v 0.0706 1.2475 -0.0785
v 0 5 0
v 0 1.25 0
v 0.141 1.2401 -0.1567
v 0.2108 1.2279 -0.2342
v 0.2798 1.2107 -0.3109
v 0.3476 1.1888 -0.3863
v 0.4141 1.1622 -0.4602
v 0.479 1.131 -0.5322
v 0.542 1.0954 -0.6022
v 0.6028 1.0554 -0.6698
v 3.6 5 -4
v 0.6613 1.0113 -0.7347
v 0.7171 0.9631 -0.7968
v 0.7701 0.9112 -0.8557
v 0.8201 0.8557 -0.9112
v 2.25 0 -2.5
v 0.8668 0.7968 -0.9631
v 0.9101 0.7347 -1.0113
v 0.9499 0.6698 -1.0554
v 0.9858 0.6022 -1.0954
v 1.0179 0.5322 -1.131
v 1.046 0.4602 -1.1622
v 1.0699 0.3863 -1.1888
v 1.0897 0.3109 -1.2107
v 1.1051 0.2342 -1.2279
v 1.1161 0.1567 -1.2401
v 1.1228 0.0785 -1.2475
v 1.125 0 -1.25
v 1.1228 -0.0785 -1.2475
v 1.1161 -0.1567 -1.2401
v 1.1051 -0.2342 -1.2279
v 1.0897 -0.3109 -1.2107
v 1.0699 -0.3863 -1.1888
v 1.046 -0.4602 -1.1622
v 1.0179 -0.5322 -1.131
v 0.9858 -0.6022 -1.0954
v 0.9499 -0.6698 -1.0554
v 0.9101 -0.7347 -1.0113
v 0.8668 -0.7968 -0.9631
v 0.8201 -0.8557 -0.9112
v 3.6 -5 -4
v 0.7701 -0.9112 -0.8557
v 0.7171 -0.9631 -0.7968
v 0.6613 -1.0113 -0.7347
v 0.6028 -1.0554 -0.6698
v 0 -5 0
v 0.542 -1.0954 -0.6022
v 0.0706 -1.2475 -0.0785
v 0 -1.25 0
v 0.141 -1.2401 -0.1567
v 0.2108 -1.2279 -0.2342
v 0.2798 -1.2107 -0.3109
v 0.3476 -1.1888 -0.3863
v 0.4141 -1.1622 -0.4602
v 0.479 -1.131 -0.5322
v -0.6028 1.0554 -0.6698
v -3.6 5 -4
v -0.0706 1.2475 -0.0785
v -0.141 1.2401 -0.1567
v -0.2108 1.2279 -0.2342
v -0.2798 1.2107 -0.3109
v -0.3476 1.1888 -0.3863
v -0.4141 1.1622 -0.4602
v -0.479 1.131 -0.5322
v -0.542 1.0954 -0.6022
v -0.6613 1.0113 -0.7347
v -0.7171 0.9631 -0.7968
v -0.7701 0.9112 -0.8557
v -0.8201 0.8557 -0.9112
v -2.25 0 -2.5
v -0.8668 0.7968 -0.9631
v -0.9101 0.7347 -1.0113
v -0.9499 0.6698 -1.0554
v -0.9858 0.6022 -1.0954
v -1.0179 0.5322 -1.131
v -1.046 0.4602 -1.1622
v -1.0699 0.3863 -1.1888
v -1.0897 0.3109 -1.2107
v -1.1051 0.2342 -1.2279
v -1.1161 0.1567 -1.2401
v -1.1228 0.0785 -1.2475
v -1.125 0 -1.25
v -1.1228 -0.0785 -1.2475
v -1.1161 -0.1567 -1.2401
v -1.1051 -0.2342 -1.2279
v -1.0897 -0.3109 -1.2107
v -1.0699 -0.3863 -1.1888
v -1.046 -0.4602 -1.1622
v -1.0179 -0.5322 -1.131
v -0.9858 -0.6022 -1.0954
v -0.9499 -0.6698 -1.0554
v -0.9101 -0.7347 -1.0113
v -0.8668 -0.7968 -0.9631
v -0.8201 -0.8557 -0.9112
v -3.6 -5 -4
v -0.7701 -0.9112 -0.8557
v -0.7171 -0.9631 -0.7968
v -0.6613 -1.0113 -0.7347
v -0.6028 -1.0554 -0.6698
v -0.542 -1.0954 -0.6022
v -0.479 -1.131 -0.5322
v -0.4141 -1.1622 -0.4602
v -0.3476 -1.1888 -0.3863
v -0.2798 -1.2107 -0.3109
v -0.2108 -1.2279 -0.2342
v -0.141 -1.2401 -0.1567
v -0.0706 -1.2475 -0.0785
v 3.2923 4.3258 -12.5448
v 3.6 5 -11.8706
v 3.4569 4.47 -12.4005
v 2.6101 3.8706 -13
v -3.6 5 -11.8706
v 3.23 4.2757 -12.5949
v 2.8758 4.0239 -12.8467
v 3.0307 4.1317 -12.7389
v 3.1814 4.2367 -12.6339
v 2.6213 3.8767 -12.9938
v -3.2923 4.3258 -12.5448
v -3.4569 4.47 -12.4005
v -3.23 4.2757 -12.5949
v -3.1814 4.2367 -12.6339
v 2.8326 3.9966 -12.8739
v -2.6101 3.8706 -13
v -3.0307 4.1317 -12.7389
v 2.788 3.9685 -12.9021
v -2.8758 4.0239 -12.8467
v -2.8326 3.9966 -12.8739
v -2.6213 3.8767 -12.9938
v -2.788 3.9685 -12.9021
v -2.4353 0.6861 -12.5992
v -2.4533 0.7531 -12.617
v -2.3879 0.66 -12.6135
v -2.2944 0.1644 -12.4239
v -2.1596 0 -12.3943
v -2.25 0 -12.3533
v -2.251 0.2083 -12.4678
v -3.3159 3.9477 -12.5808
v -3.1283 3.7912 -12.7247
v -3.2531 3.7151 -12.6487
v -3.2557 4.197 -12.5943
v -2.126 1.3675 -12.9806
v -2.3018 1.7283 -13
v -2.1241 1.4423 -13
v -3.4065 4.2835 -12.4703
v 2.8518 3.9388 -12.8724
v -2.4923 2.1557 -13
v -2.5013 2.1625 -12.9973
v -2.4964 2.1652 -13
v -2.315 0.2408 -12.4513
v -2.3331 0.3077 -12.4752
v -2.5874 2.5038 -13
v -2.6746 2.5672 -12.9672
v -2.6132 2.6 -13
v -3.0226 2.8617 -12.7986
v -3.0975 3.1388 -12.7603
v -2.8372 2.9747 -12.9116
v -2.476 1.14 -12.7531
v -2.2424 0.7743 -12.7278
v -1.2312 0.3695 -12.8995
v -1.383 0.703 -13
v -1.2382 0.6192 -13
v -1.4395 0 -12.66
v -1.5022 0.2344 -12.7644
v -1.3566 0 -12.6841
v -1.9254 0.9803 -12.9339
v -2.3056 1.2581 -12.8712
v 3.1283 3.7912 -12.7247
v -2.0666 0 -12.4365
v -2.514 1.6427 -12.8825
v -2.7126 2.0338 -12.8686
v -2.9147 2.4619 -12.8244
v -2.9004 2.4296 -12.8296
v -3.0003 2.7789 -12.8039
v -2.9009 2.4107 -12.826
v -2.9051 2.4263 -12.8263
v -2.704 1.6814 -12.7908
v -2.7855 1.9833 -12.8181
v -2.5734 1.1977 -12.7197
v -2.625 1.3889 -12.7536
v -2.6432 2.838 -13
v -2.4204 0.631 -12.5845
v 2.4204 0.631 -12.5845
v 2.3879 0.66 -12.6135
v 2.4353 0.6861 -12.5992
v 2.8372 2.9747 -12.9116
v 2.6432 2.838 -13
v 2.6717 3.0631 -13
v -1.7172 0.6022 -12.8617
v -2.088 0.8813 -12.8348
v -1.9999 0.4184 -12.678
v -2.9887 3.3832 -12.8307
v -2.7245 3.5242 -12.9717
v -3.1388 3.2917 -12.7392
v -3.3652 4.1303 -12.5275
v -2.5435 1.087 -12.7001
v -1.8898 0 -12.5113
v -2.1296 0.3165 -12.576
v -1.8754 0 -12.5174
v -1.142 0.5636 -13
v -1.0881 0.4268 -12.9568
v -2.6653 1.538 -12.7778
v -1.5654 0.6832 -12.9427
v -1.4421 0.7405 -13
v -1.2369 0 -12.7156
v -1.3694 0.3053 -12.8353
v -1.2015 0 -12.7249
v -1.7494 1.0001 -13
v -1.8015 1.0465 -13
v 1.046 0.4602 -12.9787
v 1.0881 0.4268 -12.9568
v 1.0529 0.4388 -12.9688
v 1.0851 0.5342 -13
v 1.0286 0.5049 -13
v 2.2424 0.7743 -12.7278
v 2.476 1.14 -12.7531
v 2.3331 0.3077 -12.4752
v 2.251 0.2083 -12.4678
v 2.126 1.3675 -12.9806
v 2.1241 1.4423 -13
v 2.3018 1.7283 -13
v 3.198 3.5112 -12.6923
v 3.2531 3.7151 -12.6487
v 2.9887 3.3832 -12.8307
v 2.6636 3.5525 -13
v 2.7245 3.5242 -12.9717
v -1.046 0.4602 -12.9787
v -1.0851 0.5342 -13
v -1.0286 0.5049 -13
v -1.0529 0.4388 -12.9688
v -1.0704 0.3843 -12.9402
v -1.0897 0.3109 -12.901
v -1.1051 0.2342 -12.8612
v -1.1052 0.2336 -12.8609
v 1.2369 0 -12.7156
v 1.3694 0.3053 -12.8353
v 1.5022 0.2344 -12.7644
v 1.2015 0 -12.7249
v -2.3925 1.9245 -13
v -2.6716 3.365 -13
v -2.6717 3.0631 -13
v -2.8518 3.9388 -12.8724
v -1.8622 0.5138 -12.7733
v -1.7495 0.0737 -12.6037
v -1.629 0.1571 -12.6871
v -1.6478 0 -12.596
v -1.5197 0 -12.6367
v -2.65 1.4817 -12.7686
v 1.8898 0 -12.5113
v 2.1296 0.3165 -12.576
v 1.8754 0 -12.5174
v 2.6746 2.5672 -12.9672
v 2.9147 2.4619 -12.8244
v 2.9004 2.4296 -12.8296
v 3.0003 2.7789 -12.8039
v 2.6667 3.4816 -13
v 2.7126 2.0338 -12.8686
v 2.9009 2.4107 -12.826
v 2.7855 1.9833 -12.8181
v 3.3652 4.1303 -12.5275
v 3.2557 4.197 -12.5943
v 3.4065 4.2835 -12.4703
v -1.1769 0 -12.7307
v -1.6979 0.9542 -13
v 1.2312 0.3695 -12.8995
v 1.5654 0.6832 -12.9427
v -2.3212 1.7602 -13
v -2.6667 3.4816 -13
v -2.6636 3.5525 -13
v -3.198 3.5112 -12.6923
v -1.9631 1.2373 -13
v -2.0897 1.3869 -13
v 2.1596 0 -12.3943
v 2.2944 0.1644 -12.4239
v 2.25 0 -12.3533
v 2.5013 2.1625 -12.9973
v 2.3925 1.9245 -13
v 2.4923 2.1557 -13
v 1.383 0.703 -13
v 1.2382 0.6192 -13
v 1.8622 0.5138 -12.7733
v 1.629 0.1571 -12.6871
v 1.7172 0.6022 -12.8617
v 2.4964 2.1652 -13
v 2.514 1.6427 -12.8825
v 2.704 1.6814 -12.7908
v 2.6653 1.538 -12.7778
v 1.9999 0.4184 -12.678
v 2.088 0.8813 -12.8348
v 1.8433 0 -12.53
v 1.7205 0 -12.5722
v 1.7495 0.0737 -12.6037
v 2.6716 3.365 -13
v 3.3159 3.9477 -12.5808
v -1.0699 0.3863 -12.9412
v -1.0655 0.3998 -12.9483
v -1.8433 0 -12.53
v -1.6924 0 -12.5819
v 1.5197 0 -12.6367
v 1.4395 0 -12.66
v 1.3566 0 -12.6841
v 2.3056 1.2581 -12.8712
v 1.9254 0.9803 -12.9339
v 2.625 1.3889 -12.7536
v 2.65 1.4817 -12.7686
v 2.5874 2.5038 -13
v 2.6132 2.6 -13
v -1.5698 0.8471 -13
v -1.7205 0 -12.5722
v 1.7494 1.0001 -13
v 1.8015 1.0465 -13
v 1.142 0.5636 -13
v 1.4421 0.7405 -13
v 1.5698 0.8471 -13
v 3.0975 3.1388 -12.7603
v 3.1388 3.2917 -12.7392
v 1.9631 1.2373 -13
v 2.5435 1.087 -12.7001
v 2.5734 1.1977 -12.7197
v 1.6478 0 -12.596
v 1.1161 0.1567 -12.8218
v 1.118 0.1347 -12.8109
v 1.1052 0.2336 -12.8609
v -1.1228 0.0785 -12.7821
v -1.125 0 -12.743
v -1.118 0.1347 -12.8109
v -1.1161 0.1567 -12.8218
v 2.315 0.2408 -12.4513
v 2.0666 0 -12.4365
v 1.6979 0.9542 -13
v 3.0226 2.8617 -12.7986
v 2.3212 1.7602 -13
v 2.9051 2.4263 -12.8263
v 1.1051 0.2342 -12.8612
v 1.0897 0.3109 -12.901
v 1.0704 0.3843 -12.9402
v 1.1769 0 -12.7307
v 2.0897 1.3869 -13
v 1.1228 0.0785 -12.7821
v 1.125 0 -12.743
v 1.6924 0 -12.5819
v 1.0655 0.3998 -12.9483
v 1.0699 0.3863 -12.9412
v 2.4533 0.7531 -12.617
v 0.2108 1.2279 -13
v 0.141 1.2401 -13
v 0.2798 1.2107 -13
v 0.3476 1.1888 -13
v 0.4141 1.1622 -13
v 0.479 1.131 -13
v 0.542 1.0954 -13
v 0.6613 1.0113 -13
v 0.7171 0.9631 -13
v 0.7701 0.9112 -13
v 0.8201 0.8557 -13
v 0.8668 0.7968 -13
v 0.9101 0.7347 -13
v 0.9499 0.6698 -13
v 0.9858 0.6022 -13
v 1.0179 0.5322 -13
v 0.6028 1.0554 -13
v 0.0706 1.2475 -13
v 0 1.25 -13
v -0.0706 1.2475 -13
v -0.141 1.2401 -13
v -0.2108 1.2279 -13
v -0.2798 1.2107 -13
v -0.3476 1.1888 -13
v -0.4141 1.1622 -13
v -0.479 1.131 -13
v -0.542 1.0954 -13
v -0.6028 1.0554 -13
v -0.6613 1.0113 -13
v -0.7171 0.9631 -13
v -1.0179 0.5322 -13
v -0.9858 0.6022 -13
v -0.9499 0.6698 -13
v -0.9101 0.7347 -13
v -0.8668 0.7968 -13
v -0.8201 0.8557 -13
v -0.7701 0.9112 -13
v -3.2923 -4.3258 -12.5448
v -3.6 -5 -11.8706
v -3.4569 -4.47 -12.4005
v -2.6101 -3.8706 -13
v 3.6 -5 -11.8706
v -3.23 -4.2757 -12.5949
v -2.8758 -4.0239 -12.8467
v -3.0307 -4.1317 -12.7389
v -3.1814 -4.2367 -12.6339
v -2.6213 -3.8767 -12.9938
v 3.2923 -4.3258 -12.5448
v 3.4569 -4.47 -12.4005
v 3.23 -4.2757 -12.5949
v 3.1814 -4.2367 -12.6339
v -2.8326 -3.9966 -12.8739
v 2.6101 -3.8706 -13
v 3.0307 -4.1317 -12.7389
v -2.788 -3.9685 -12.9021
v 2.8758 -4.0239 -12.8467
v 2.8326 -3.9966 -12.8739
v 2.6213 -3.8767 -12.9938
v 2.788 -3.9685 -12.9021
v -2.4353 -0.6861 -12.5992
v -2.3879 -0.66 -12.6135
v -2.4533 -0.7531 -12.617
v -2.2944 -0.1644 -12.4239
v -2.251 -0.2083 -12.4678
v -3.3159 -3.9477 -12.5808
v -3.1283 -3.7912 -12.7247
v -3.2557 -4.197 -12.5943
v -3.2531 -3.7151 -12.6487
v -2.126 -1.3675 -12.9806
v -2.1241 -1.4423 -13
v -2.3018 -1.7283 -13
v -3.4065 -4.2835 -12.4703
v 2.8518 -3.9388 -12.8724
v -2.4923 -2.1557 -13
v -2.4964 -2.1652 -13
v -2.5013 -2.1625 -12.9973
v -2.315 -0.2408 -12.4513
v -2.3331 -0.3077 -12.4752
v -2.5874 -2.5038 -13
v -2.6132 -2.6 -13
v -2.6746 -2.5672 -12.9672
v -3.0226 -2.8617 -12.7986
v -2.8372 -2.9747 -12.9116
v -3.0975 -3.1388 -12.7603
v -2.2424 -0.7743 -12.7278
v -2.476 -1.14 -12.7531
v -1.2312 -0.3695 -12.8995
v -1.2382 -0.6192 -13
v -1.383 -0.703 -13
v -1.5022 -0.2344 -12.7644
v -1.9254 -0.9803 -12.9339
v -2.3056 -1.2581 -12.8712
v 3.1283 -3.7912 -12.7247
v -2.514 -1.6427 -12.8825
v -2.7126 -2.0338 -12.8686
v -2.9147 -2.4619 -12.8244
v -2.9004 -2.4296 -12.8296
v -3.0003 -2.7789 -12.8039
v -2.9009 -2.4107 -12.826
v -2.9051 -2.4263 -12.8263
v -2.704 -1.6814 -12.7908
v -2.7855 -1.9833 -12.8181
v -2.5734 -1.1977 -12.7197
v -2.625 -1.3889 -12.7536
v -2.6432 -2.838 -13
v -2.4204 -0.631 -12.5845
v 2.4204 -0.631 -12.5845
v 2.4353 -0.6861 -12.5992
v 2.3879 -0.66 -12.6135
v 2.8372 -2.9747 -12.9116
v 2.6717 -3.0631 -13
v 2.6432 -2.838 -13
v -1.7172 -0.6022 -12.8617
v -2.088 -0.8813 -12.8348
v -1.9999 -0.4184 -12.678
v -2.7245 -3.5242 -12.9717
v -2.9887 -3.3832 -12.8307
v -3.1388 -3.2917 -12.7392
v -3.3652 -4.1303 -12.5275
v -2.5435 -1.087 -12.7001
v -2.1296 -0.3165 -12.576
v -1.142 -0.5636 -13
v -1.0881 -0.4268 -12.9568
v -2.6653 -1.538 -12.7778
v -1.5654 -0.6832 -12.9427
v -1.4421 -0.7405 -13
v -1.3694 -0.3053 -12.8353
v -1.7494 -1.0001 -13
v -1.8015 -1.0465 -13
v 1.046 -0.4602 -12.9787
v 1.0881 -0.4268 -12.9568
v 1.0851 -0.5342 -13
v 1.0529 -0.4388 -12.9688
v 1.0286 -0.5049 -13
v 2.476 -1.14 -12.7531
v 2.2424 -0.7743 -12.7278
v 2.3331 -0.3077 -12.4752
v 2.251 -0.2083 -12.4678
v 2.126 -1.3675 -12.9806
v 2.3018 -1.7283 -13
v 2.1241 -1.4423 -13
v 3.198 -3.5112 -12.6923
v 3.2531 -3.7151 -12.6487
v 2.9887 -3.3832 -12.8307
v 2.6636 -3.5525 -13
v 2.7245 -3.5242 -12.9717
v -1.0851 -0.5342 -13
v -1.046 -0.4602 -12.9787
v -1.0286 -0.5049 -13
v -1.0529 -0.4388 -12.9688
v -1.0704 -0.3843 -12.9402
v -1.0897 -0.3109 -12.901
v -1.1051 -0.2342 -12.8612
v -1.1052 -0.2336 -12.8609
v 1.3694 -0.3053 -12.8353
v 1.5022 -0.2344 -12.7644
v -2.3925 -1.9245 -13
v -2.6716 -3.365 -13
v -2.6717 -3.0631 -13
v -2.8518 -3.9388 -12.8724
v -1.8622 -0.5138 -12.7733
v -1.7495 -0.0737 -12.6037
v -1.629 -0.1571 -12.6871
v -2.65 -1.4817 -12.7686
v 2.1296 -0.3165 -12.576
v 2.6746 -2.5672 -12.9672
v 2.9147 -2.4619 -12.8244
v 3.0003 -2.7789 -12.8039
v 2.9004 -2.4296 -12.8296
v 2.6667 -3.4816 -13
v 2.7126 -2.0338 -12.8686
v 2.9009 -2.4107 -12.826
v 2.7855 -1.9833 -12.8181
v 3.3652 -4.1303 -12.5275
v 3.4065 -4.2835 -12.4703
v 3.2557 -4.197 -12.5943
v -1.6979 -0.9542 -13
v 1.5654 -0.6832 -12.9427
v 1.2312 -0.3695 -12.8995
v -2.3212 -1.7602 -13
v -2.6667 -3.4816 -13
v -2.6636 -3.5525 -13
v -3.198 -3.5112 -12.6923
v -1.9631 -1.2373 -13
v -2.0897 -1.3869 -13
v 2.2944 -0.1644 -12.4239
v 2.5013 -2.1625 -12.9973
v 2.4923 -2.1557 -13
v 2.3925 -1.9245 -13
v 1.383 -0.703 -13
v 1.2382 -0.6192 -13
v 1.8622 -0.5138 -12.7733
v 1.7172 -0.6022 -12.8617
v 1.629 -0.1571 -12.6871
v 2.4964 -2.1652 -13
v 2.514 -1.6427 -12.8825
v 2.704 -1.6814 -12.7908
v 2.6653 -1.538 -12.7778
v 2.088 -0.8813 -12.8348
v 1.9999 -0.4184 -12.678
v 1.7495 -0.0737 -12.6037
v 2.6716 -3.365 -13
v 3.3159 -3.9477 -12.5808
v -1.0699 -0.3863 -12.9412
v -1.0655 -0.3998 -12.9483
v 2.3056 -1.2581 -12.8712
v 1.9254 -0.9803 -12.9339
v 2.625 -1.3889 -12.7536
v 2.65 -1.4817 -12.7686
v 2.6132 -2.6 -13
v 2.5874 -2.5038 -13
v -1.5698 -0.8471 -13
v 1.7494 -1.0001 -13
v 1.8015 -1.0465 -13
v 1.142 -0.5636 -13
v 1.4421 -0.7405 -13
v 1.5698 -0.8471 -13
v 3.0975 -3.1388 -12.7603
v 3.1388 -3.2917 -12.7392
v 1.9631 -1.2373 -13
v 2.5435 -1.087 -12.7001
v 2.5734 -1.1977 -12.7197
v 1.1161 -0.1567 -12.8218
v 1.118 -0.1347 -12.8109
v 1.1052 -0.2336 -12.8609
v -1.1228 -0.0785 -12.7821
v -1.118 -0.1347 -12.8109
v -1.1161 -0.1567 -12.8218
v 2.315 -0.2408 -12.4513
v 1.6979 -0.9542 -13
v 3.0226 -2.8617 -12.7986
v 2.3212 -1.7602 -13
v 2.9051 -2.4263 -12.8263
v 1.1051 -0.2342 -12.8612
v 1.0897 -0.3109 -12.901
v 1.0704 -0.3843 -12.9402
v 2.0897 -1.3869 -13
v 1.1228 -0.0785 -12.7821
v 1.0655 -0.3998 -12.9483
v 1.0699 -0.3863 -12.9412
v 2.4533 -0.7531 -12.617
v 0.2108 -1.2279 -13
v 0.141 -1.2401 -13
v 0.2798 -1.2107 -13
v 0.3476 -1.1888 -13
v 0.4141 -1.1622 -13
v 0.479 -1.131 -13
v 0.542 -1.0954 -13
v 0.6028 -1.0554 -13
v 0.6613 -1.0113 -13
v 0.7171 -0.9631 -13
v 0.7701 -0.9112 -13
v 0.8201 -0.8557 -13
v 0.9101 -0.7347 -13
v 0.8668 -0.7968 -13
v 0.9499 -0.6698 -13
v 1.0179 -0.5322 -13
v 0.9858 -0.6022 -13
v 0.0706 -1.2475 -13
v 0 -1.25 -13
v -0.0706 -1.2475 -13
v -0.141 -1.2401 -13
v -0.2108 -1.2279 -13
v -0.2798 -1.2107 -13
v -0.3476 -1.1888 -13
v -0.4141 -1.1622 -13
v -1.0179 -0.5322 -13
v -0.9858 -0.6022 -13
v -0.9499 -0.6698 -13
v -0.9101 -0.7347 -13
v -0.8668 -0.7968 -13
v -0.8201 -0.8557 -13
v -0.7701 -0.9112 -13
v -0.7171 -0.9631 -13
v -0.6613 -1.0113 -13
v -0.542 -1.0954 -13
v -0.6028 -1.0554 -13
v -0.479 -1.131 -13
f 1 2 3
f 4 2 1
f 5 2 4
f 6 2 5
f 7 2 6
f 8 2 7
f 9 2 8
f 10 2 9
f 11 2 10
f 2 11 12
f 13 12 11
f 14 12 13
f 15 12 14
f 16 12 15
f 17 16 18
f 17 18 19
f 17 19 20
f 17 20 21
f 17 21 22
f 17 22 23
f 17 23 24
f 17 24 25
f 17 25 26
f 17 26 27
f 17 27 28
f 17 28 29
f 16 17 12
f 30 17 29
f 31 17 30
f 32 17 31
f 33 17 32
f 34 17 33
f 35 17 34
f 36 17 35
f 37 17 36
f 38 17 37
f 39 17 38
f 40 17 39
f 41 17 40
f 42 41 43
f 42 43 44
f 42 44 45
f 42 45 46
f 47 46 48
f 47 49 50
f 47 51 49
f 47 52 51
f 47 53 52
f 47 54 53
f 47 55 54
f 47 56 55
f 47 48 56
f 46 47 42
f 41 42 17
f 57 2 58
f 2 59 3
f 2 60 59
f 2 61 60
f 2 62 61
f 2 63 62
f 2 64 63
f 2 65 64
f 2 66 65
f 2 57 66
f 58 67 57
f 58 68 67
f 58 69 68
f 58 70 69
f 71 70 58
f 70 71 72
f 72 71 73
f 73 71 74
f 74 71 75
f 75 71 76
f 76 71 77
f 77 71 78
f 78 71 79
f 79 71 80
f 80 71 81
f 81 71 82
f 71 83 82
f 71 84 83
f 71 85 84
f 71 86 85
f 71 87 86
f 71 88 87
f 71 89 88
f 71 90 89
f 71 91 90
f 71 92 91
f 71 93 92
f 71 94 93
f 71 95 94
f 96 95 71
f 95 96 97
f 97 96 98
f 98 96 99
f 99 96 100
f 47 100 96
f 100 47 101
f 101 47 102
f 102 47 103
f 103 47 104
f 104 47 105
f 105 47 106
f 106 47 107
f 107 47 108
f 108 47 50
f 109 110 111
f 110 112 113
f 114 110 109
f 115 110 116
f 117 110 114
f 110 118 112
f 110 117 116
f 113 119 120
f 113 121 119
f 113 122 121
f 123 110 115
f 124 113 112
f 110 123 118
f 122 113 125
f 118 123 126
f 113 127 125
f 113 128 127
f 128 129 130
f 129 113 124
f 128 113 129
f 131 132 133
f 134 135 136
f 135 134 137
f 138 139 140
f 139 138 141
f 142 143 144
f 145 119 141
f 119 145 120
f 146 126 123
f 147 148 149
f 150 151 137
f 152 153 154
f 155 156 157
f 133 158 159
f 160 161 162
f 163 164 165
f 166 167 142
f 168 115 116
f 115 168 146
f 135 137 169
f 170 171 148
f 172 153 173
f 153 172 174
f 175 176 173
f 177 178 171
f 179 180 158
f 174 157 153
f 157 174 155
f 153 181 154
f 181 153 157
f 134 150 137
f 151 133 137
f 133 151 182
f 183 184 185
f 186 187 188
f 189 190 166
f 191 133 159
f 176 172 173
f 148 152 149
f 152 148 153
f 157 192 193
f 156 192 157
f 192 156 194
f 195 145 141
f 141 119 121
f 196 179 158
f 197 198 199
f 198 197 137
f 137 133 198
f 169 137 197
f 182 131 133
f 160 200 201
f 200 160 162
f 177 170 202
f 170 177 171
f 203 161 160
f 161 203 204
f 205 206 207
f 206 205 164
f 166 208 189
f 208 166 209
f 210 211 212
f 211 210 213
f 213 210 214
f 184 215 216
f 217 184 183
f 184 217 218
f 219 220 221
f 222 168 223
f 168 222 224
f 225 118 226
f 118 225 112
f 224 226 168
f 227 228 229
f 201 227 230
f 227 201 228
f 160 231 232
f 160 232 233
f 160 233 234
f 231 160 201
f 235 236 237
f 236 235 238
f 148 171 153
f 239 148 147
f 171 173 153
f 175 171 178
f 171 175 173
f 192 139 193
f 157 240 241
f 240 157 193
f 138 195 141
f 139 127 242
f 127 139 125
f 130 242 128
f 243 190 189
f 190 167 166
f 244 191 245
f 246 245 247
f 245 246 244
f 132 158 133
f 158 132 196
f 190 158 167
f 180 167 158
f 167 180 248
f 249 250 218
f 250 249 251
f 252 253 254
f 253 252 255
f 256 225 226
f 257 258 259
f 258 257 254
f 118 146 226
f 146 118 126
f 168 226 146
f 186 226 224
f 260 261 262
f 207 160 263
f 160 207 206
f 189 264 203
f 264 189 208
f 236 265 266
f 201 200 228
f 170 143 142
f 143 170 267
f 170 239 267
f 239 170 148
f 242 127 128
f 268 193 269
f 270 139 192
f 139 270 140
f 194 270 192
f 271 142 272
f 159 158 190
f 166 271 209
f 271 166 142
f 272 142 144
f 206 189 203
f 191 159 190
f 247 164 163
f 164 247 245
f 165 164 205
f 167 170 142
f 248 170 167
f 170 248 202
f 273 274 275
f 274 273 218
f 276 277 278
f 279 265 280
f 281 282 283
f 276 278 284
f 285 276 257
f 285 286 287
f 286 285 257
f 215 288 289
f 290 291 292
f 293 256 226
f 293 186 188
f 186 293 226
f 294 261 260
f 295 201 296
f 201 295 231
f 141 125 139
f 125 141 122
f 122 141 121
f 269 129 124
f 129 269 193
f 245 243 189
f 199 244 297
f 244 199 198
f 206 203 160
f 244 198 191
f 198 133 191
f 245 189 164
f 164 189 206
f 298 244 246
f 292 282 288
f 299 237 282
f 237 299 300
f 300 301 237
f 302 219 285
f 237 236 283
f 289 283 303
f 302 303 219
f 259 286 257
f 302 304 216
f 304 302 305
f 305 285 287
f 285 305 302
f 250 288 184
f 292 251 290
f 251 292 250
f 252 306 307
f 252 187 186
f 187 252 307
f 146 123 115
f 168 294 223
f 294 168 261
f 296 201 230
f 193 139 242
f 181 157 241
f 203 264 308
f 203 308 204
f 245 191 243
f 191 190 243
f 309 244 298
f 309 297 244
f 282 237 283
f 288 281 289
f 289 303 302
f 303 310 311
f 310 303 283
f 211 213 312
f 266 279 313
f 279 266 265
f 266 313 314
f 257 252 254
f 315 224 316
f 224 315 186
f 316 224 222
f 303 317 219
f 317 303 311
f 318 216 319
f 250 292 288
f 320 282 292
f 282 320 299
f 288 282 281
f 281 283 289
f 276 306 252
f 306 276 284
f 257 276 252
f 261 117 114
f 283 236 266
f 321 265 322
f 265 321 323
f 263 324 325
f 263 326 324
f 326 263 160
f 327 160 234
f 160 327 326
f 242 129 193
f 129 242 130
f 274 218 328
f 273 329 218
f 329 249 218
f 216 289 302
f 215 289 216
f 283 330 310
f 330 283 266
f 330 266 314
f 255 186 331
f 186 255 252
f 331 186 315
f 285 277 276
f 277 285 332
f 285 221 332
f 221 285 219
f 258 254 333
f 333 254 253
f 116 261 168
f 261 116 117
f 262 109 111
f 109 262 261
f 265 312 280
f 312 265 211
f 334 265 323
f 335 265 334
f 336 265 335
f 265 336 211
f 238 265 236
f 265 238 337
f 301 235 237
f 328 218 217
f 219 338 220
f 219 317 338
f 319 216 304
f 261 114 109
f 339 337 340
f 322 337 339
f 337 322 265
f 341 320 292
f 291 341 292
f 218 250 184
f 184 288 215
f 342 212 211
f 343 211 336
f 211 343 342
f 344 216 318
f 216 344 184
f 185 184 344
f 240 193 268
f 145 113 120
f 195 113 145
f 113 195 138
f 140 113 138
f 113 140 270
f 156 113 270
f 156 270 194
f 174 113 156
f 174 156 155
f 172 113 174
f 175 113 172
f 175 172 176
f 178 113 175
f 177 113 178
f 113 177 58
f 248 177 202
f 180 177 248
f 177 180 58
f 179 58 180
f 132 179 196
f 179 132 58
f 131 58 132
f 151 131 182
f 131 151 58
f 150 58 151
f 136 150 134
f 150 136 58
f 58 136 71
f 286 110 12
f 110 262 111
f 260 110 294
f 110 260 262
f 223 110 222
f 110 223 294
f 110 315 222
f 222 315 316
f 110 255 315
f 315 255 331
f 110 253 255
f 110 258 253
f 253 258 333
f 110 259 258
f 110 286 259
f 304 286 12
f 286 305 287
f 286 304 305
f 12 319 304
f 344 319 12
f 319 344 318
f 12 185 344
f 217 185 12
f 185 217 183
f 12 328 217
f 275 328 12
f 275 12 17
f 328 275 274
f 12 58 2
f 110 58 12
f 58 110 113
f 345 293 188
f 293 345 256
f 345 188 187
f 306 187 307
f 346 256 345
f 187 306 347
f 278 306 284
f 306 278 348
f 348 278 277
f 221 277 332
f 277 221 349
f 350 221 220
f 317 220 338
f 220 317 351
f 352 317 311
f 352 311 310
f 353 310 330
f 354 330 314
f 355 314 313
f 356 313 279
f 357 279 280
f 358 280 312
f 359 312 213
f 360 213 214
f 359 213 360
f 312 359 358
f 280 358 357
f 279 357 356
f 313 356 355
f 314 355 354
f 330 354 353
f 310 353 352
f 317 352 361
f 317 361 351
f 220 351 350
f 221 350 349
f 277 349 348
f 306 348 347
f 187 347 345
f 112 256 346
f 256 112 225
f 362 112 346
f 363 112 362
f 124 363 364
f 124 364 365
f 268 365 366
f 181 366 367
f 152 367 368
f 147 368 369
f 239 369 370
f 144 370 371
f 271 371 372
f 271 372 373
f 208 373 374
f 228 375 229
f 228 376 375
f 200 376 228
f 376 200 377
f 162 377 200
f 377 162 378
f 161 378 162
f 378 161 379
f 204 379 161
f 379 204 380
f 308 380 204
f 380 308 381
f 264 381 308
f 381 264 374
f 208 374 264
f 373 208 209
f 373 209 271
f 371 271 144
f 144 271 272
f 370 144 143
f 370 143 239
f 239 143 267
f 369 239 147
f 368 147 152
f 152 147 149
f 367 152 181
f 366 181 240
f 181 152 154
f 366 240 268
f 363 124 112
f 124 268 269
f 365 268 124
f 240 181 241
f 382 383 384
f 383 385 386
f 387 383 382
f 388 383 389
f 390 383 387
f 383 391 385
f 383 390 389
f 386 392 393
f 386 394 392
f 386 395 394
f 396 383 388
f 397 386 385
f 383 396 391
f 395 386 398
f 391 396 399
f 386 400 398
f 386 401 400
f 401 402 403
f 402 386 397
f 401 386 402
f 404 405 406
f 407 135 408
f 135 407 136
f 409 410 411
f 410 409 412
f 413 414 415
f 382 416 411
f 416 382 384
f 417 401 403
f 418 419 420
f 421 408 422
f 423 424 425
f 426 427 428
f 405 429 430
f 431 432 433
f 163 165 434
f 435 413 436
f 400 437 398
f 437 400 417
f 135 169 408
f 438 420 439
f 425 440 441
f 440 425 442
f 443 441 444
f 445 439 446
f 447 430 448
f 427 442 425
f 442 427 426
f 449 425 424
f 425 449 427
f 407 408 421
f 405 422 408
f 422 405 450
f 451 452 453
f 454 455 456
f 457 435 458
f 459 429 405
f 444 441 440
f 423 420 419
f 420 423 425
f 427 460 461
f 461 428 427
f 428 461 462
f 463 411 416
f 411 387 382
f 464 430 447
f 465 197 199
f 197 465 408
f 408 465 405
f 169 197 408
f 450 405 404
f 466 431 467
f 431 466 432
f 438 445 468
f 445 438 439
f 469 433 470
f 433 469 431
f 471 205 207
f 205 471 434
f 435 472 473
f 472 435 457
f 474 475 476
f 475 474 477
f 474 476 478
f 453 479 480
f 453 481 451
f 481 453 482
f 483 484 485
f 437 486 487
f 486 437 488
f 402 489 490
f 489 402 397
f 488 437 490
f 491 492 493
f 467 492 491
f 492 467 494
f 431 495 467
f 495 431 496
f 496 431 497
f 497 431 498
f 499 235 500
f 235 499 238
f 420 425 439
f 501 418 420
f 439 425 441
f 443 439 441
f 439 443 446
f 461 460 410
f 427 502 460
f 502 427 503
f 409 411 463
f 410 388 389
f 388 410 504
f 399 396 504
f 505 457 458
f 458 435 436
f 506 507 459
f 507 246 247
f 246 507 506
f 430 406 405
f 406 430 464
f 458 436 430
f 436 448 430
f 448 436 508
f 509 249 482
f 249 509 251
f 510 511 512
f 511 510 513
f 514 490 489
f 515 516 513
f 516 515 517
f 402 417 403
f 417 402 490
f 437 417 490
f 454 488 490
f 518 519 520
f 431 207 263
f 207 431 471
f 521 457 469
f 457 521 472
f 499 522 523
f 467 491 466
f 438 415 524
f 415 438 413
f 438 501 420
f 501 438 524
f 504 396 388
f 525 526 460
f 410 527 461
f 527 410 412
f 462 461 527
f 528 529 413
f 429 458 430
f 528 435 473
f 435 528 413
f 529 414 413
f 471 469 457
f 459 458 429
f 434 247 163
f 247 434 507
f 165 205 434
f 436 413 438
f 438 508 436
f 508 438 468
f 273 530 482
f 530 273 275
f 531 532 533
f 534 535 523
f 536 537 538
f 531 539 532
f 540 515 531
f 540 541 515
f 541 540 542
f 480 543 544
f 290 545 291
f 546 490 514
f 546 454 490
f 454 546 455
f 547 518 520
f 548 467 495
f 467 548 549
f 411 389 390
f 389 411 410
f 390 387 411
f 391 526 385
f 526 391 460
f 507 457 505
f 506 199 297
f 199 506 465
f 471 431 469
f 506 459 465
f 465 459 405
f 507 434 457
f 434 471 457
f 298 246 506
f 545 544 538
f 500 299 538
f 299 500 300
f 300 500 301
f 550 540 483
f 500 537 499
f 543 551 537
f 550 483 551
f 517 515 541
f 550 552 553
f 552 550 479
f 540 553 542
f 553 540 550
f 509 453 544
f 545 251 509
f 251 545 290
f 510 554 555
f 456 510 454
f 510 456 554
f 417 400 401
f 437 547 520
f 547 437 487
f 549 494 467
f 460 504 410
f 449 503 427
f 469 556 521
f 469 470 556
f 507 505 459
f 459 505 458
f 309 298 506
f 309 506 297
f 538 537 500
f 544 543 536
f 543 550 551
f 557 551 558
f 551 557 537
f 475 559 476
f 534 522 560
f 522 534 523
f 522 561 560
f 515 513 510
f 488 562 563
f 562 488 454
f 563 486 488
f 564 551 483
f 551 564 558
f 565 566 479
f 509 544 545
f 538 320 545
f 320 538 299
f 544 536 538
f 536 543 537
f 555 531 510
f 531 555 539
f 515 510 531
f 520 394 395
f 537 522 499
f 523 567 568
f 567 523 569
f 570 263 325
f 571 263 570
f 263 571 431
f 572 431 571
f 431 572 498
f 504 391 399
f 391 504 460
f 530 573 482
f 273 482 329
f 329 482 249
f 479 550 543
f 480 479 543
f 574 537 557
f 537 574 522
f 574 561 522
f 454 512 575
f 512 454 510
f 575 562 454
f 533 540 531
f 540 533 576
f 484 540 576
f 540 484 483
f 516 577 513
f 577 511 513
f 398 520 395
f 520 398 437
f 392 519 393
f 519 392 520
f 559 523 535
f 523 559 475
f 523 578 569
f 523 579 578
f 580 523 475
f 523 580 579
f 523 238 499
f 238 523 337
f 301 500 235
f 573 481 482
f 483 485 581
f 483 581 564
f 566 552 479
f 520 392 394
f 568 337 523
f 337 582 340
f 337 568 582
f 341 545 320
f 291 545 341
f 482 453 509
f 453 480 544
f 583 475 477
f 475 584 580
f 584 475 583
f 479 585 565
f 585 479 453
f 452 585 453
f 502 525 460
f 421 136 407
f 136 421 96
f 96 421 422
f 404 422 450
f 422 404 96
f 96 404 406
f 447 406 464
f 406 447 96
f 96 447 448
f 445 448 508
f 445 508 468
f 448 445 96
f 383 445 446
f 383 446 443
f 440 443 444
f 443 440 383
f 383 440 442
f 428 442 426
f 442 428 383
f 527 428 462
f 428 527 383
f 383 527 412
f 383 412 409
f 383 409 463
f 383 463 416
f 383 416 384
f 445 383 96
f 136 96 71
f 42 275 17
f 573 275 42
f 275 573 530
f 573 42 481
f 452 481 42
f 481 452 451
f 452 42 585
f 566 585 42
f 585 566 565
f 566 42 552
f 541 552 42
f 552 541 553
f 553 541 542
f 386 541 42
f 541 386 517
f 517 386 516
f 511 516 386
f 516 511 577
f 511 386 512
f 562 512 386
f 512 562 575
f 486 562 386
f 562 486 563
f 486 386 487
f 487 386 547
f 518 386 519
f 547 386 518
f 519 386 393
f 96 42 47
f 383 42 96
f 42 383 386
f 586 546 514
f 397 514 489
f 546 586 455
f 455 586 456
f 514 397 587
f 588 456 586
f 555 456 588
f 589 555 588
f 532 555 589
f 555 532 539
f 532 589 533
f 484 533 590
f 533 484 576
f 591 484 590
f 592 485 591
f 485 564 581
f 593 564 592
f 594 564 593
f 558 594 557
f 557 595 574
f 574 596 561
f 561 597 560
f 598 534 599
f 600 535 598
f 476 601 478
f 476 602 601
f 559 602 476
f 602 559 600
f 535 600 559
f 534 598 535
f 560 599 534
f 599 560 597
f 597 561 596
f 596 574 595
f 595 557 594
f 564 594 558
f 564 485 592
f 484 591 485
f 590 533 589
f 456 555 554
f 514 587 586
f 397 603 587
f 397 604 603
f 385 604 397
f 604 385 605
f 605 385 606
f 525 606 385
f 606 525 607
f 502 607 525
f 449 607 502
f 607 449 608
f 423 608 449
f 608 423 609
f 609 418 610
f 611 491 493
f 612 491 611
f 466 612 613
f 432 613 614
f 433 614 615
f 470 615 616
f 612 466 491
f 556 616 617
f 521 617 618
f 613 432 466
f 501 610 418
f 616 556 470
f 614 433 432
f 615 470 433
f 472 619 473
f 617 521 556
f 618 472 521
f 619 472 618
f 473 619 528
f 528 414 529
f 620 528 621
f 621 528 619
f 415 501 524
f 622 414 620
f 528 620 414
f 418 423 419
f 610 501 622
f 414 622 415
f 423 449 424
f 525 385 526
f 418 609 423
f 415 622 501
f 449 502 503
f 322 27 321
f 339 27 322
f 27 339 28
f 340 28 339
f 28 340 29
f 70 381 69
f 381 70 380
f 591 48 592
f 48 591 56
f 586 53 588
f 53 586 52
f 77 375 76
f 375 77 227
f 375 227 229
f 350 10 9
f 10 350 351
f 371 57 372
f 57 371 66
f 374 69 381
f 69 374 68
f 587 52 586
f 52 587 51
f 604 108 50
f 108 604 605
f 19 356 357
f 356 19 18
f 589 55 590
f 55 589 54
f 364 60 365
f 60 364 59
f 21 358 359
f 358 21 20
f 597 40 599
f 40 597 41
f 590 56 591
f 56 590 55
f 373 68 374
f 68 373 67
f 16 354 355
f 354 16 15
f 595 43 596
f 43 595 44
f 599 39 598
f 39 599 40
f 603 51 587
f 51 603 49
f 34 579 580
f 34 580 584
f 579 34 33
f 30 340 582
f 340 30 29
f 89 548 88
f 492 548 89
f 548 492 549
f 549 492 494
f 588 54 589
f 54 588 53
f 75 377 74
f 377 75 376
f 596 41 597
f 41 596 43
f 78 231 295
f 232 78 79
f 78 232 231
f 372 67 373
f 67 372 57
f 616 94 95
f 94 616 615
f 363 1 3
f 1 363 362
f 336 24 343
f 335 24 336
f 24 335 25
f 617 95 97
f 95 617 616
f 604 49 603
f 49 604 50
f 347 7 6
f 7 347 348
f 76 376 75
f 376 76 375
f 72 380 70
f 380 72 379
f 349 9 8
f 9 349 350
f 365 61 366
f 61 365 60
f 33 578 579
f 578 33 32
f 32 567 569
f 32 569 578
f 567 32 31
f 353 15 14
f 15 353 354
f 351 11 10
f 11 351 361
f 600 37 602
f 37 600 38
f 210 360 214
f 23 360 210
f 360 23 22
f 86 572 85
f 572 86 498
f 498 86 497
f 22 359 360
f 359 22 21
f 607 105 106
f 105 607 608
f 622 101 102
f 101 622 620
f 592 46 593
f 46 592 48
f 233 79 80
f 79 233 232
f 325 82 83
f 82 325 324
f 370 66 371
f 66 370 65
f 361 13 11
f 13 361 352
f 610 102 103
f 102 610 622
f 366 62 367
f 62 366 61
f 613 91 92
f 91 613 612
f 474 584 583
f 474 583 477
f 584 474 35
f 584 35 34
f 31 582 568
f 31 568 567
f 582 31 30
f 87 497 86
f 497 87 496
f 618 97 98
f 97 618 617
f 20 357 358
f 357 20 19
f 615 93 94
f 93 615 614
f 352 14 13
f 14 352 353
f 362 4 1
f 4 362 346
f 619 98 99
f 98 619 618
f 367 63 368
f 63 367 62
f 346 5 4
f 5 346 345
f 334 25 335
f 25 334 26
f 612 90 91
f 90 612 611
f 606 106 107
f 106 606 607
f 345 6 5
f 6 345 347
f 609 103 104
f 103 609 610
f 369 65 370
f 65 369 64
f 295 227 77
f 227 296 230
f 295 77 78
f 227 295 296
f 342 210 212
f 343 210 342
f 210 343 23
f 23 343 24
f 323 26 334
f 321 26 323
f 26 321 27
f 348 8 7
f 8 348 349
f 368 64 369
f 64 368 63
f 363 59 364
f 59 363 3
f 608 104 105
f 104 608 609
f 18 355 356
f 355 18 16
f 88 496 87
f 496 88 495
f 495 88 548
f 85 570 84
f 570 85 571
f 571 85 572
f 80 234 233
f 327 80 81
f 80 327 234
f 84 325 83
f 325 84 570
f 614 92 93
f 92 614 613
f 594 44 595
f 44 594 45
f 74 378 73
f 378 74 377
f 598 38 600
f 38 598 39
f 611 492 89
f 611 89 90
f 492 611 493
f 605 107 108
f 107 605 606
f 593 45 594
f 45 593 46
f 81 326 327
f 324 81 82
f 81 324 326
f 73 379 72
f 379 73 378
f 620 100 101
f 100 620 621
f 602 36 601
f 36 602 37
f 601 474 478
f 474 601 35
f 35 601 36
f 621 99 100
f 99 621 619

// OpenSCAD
// file: ../../globals.scad
/*
Most things in this file is represented as one millimeter, so keep that in mind while changing things.
Some of the setting are not mm but at variables that you can set, such as 2*x=2x and you are setting what x is.
I will try to specify when things are variables and not exact measurements.
*/

//Virindi settings
dovetail_male_width_scale = 0.98;
dovetail_male_height_scale = 0.91;

obj_leg = 30;
leg_length = 5.5;
small_number = 0.001;
metal_core_rode_global = 5;


///////////////// number of holes /////////////////////
z_hole_number = 8;
other_holes = 8;

///////////////// Pins /////////////////////

//pins that poke out
ball_size = 10;
pin_height = 20;
pin_diameter = 6;


//holes
hole_ball_size = ball_size;
hole_pin_height = pin_height;
hole_pin_diameter = pin_diameter;

///////////////// Z THINGS /////////////////////

berring_slot_width = 7.5;
berring_slot_depth = 6.5;
metal_core_rode = 5;

///////////////// X THINGS /////////////////////

//male dove tails
max_width=8;
min_width=5;
depth=5;
height=obj_leg/2;

//female dove tails, this is found on the y mounts
girl_max_width=11;
girl_min_width=5;
girl_depth=5;
girl_height=obj_leg;


///////////////// Y THINGS /////////////////////
/*
The Y is so normal that all of those global variables at the top should change all of the setting in it, this section is set her incase there are variables set in the future development of this project.
*/
// file: ../../include.scad
//////////////////      END SECTION       //////////////////

	module added_pins(){
		difference(){
			union(){
				translate([30/(15/4),obj_leg*leg_length,30/(15/4)]) pin();
				translate([30/(15/4)+14.5,obj_leg*leg_length,30/(15/4)+14]) pin();
			}
			union(){
							translate([30/(15/4)+13.5,obj_leg*leg_length-20,30/(15/4)+5])cube(size=[2,40,15]);
							translate([30/(15/4)+7.5,obj_leg*leg_length-20,30/(15/4)+15])rotate([0,90,0]) cube(size=[2,40,15]);	

							translate([30/(15/4)-1,obj_leg*leg_length-20,30/(15/4)-8])cube(size=[2,40,15]);
							translate([30/(15/4)-10,obj_leg*leg_length-20,30/(15/4)+1])rotate([0,90,0]) cube(size=[2,40,15]);
			}
		}
	}
	module taken_pins() {
		translate([30/(15/4)+14,obj_leg*leg_length-10,30/(15/4)]) mirror_pin();
		translate([30/(15/4),obj_leg*leg_length-10,30/(15/4)+15]) mirror_pin();
	}


//////////////////      OTHER STUFF       //////////////////

	module holes() {
		rotate([0,0,90]) for(y=[0:other_holes])
		translate([obj_leg+y*15,-15.5,7.5]) union() {
			translate([7.5,0,15]) hole_up();
			hole_down();
		}
	}
	module extend_holes() {
	module top(){
		rotate([0,0,90]) for(y=[0:other_holes+1])
		translate([(30/4)+y*15,-15.5,7.5]) union() {
			translate([7.5,0,15]) hole_up();
		}
	}
	module bottom(){
		rotate([0,0,90]) for(y=[0:other_holes+2])
		translate([(30/4)+y*15,-15.5,7.5]) union() {
			hole_down();
		
}
	}
	union(){
		top();
		bottom();
	}
	}

	module hole() {
		union() {
			rotate([90, 90, 0]) cylinder(h=40, d=hole_pin_diameter, center=true);
			translate([0,7.5,0]) sphere(d=hole_ball_size);
			translate([0,-6,0]) sphere(d=hole_ball_size);
		}
	}
	module hole_up() {
		union() {
			rotate([90, 90, 0]) cylinder(h=40, d=hole_pin_diameter, center=true);
			translate([0,7.5,10]) cylinder(h=hole_pin_height, d=hole_pin_diameter, center=true);
			translate([0,-6,10]) cylinder(h=hole_pin_height, d=hole_pin_diameter, center=true);
			translate([0,7.5,0]) sphere(d=hole_ball_size);
			translate([0,-6,0]) sphere(d=hole_ball_size);
		}
	}
	module hole_down() {
		union() {
			rotate([90, 90, 0]) cylinder(h=40, d=hole_pin_diameter, center=true);
			translate([0,7.5,-10]) cylinder(h=hole_pin_height, d=hole_pin_diameter, center=true);
			translate([0,-6,-10]) cylinder(h=hole_pin_height, d=hole_pin_diameter, center=true);
			translate([0,7.5,0]) sphere(d=hole_ball_size);
			translate([0,-6,0]) sphere(d=hole_ball_size);
		}
	}
	module pin() {
		union() {
			rotate([90, 90, 0]) cylinder(h=pin_height, d=pin_diameter, center=true);
			translate([0,7.5,0]) sphere(d=ball_size);
		}
	}

	module mirror_pin() {
		rotate([90, 90, 0]) cylinder(h=hole_pin_height+small_number, d=hole_pin_diameter, center=true);
		translate([0,-(pin_height-(ball_size/2)),0]) sphere(d=ball_size);
	}


//////////////////      SOME RACK AND Z THINGS       //////////////////

module z_holes() {
    rotate([0,-90,0]) for(z=[0:z_hole_number])
    translate([22.5+z*15,16,-12])
        hole();
}

module pin_cuts() {
	union(){
		cube(size=[2,10,40], center=true);
		rotate([0,0,90]) cube(size=[2,10,40], center=true);
	}
}
module pin_uncut() {
	union(){
		rotate([0, 0, 90]) cylinder(h=hole_pin_height, d=hole_pin_diameter, center=true);
		translate([0,0,10]) sphere(d=ball_hole);
	}
}


module pin_out() {
	union(){
		rotate([0, 0, 90]) cylinder(h=pin_height, d=pin_diameter, center=true);
		translate([0,0,10]) sphere(d= ball_size);
	}
}


module pins_z(){
	difference() {
		pin_out();
		pin_cuts();
	}
}
//////////////////      RACK AND SLIDE     ///////////////////

module straight_pins() {
	for(z=[0:((((obj_leg*leg_length)*2)-(obj_leg*2))/3)/14.5]) rotate([-90,0,0]) translate([z*15,30/(15/4),14]) pins_z();
	for(z=[0:((((obj_leg*leg_length)*2)-(obj_leg*2))/3)/14.5]) rotate([-90,0,0]) translate([z*15,30/(15/4)-14,14]) pins_z();
}
module stagger_pins() {
	for(z=[0:((((obj_leg*leg_length)*2)-(obj_leg*2))/3)/14.5]) rotate([-90,0,0]) translate([z*15,30/(15/4),14]) pins_z();
	for(z=[0:((((obj_leg*leg_length)*2)-(obj_leg*2))/3)/14.5]) rotate([-90,0,0]) translate([z*15+7,30/(15/4)-14,14]) pins_z();
}


//////////////////      DOVE TAIL       //////////////////

module male_dovetail(height) {
	dovetail_3d(max_width,min_width,depth,height);
}

module dovetail_3d(max_width=11, min_width=5, depth=5, height=30) {
	linear_extrude(height=height, convexity=2)
		dovetail_2d(max_width,min_width,depth);
}

module dovetail_2d(max_width=11, min_width=5, depth=5) {
	angle=atan((max_width/2-min_width/2)/depth);
	echo("angle: ", angle);
	polygon(paths=[[0,1,2,3,0]], points=[[-min_width/2,0], [-max_width/2,depth], [max_width/2, depth], [min_width/2,0]]);
}

//bow tie
	module tie_end(height){
				rotate([0,0,0]) translate([0,-0.01,((obj_leg/2)/2)]) male_dovetail(height);
				rotate([0,90,0]) translate([0,-0.01,((obj_leg/2)/2)]) male_dovetail(height);
				rotate([0,180,0]) translate([0,-0.01,((obj_leg/2)/2)]) male_dovetail(height);
				rotate([0,-90,0]) translate([0,-0.01,((obj_leg/2)/2)]) male_dovetail(height);
	}

module bow_support(){
	difference(){
		intersection(){
			translate([-15,0,-15]) cube([30,9,30]);
			scale([1.05,1.05,1.05]) rotate([0,45,0]) tie_end();
		}
		cube([29.2,29.2,29.2], center=true);
	}
}

	module wrap(units){
	for (y = [-1:units-2]) // two iterations, z = -1, z = 1
	{
			translate([15, (y*30)+15, 15]){
			for (r = [0:4]) // two iterations, z = -1, z = 1
			{
				rotate([0,r*90,0]) translate([0,15,15]) rotate([-90,0,0])male_dovetail(height=30);
			}
		}
	}
	}
// main file
smoothing = 100;
length = 13;
tilt_level = 1.1;
scaling_x = .9;
scaling_y = 1;
scaling_z = 1;
include <../../include.scad>;
include <../../globals.scad>;

obj_leg= 12;
$fn = smoothing;
module bow_tie_master(){
	union(){
		mirror([0,1,0]) 		intersection(){
			intersection(){
				rotate([0,-45,0]) cube([obj_leg,obj_leg,obj_leg]);
				translate([-obj_leg/2,(obj_leg/2)-tilt_level,-5]) rotate([45,0,0]) cube([obj_leg,obj_leg,obj_leg*2]);
				#translate([0,length/4,length*.5]) rotate([45,0,0]) sphere(d=length*tilt_level);
			}
			male_dovetail(height=length);
		}
		
		intersection(){
			intersection(){
				rotate([0,-45,0]) cube([obj_leg,obj_leg,obj_leg]);
				translate([-obj_leg/2,(obj_leg/2)-tilt_level,-5]) rotate([45,0,0]) cube([obj_leg,obj_leg,obj_leg*2]);
				#translate([0,length/4,length*.5]) rotate([45,0,0]) sphere(d=length*tilt_level);
			}
			male_dovetail(height=length);
		}
		
	}
}
module bow_holes() {
	//translate([-10,-2.5,-2.5]) rotate([0,90,0]) #cylinder(h=50, d=1.5);
	//translate([-10,2.5,-2.5]) rotate([0,90,0]) #cylinder(h=50, d=1.5);
}

module finished(){
	rotate([0,45*0,0]){
		difference(){
			rotate([0,180,0]) bow_tie_master();
			bow_holes();
            translate([0,0,-25]) cylinder(d=2.5, h=50);
		}
	}
}

scale([scaling_x,scaling_y,scaling_z]) finished();
